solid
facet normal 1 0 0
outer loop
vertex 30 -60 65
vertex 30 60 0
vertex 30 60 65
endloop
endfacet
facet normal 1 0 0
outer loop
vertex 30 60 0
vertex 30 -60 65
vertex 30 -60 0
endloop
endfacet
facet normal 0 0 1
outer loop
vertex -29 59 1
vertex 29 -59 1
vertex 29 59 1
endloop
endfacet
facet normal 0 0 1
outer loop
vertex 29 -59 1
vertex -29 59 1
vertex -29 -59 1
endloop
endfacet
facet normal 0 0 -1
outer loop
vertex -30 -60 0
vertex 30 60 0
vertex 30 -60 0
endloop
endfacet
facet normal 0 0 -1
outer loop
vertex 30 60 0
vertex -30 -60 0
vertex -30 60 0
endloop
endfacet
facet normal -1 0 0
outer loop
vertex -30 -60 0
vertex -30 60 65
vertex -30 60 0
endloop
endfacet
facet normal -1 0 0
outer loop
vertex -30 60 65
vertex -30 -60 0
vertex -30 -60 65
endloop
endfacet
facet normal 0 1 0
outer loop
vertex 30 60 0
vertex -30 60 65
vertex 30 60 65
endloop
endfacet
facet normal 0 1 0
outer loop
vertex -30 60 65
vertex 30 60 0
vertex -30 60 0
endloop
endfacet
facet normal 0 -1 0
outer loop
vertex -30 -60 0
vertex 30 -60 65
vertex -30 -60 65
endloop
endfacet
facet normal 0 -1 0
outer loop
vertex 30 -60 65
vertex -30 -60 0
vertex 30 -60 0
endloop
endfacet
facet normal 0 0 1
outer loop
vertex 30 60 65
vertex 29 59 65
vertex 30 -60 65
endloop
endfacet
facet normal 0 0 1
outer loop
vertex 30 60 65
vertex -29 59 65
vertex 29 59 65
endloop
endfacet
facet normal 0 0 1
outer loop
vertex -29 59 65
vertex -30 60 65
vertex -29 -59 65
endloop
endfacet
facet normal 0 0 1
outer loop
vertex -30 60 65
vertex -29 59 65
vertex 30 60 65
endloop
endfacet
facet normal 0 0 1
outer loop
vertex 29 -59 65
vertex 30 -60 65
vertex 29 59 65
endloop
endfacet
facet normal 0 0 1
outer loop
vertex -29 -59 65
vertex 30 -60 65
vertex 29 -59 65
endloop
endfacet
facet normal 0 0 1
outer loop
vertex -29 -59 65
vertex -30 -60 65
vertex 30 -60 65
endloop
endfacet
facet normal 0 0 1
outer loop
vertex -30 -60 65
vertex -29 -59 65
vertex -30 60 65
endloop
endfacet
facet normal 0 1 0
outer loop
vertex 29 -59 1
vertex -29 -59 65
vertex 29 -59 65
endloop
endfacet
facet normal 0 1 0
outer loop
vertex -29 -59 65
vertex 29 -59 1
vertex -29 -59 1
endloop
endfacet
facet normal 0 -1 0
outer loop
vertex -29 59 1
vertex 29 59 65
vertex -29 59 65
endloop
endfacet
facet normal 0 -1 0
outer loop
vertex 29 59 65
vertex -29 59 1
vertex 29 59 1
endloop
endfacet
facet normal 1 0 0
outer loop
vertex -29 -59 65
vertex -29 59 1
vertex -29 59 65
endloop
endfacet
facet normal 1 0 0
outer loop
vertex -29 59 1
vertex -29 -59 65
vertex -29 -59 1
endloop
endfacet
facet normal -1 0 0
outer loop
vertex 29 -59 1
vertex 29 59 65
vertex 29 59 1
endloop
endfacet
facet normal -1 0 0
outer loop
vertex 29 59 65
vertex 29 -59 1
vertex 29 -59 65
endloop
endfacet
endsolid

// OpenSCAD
gridSize=60;

numberOfLengths=1;
numberOfWidth=2;

length=(gridSize*numberOfLengths);
width=(gridSize*numberOfWidth);
height=65;
bottom_thickness=1;
wall_thickness=1;

translate([-(length/2),-(width/2),0]){
    cube([length,width,bottom_thickness]);
}

translate([-(length/2),-(width/2),0]){
    cube([length,wall_thickness,height]);
}

translate([-(length/2),(width/2-wall_thickness),0]){
    cube([length,wall_thickness,height]);
}

translate([-(length/2),(-width/2),0]){
    cube([wall_thickness,width,height]);
}

translate([(length/2-wall_thickness),(-width/2),0]){
    cube([wall_thickness,width,height]);
}
